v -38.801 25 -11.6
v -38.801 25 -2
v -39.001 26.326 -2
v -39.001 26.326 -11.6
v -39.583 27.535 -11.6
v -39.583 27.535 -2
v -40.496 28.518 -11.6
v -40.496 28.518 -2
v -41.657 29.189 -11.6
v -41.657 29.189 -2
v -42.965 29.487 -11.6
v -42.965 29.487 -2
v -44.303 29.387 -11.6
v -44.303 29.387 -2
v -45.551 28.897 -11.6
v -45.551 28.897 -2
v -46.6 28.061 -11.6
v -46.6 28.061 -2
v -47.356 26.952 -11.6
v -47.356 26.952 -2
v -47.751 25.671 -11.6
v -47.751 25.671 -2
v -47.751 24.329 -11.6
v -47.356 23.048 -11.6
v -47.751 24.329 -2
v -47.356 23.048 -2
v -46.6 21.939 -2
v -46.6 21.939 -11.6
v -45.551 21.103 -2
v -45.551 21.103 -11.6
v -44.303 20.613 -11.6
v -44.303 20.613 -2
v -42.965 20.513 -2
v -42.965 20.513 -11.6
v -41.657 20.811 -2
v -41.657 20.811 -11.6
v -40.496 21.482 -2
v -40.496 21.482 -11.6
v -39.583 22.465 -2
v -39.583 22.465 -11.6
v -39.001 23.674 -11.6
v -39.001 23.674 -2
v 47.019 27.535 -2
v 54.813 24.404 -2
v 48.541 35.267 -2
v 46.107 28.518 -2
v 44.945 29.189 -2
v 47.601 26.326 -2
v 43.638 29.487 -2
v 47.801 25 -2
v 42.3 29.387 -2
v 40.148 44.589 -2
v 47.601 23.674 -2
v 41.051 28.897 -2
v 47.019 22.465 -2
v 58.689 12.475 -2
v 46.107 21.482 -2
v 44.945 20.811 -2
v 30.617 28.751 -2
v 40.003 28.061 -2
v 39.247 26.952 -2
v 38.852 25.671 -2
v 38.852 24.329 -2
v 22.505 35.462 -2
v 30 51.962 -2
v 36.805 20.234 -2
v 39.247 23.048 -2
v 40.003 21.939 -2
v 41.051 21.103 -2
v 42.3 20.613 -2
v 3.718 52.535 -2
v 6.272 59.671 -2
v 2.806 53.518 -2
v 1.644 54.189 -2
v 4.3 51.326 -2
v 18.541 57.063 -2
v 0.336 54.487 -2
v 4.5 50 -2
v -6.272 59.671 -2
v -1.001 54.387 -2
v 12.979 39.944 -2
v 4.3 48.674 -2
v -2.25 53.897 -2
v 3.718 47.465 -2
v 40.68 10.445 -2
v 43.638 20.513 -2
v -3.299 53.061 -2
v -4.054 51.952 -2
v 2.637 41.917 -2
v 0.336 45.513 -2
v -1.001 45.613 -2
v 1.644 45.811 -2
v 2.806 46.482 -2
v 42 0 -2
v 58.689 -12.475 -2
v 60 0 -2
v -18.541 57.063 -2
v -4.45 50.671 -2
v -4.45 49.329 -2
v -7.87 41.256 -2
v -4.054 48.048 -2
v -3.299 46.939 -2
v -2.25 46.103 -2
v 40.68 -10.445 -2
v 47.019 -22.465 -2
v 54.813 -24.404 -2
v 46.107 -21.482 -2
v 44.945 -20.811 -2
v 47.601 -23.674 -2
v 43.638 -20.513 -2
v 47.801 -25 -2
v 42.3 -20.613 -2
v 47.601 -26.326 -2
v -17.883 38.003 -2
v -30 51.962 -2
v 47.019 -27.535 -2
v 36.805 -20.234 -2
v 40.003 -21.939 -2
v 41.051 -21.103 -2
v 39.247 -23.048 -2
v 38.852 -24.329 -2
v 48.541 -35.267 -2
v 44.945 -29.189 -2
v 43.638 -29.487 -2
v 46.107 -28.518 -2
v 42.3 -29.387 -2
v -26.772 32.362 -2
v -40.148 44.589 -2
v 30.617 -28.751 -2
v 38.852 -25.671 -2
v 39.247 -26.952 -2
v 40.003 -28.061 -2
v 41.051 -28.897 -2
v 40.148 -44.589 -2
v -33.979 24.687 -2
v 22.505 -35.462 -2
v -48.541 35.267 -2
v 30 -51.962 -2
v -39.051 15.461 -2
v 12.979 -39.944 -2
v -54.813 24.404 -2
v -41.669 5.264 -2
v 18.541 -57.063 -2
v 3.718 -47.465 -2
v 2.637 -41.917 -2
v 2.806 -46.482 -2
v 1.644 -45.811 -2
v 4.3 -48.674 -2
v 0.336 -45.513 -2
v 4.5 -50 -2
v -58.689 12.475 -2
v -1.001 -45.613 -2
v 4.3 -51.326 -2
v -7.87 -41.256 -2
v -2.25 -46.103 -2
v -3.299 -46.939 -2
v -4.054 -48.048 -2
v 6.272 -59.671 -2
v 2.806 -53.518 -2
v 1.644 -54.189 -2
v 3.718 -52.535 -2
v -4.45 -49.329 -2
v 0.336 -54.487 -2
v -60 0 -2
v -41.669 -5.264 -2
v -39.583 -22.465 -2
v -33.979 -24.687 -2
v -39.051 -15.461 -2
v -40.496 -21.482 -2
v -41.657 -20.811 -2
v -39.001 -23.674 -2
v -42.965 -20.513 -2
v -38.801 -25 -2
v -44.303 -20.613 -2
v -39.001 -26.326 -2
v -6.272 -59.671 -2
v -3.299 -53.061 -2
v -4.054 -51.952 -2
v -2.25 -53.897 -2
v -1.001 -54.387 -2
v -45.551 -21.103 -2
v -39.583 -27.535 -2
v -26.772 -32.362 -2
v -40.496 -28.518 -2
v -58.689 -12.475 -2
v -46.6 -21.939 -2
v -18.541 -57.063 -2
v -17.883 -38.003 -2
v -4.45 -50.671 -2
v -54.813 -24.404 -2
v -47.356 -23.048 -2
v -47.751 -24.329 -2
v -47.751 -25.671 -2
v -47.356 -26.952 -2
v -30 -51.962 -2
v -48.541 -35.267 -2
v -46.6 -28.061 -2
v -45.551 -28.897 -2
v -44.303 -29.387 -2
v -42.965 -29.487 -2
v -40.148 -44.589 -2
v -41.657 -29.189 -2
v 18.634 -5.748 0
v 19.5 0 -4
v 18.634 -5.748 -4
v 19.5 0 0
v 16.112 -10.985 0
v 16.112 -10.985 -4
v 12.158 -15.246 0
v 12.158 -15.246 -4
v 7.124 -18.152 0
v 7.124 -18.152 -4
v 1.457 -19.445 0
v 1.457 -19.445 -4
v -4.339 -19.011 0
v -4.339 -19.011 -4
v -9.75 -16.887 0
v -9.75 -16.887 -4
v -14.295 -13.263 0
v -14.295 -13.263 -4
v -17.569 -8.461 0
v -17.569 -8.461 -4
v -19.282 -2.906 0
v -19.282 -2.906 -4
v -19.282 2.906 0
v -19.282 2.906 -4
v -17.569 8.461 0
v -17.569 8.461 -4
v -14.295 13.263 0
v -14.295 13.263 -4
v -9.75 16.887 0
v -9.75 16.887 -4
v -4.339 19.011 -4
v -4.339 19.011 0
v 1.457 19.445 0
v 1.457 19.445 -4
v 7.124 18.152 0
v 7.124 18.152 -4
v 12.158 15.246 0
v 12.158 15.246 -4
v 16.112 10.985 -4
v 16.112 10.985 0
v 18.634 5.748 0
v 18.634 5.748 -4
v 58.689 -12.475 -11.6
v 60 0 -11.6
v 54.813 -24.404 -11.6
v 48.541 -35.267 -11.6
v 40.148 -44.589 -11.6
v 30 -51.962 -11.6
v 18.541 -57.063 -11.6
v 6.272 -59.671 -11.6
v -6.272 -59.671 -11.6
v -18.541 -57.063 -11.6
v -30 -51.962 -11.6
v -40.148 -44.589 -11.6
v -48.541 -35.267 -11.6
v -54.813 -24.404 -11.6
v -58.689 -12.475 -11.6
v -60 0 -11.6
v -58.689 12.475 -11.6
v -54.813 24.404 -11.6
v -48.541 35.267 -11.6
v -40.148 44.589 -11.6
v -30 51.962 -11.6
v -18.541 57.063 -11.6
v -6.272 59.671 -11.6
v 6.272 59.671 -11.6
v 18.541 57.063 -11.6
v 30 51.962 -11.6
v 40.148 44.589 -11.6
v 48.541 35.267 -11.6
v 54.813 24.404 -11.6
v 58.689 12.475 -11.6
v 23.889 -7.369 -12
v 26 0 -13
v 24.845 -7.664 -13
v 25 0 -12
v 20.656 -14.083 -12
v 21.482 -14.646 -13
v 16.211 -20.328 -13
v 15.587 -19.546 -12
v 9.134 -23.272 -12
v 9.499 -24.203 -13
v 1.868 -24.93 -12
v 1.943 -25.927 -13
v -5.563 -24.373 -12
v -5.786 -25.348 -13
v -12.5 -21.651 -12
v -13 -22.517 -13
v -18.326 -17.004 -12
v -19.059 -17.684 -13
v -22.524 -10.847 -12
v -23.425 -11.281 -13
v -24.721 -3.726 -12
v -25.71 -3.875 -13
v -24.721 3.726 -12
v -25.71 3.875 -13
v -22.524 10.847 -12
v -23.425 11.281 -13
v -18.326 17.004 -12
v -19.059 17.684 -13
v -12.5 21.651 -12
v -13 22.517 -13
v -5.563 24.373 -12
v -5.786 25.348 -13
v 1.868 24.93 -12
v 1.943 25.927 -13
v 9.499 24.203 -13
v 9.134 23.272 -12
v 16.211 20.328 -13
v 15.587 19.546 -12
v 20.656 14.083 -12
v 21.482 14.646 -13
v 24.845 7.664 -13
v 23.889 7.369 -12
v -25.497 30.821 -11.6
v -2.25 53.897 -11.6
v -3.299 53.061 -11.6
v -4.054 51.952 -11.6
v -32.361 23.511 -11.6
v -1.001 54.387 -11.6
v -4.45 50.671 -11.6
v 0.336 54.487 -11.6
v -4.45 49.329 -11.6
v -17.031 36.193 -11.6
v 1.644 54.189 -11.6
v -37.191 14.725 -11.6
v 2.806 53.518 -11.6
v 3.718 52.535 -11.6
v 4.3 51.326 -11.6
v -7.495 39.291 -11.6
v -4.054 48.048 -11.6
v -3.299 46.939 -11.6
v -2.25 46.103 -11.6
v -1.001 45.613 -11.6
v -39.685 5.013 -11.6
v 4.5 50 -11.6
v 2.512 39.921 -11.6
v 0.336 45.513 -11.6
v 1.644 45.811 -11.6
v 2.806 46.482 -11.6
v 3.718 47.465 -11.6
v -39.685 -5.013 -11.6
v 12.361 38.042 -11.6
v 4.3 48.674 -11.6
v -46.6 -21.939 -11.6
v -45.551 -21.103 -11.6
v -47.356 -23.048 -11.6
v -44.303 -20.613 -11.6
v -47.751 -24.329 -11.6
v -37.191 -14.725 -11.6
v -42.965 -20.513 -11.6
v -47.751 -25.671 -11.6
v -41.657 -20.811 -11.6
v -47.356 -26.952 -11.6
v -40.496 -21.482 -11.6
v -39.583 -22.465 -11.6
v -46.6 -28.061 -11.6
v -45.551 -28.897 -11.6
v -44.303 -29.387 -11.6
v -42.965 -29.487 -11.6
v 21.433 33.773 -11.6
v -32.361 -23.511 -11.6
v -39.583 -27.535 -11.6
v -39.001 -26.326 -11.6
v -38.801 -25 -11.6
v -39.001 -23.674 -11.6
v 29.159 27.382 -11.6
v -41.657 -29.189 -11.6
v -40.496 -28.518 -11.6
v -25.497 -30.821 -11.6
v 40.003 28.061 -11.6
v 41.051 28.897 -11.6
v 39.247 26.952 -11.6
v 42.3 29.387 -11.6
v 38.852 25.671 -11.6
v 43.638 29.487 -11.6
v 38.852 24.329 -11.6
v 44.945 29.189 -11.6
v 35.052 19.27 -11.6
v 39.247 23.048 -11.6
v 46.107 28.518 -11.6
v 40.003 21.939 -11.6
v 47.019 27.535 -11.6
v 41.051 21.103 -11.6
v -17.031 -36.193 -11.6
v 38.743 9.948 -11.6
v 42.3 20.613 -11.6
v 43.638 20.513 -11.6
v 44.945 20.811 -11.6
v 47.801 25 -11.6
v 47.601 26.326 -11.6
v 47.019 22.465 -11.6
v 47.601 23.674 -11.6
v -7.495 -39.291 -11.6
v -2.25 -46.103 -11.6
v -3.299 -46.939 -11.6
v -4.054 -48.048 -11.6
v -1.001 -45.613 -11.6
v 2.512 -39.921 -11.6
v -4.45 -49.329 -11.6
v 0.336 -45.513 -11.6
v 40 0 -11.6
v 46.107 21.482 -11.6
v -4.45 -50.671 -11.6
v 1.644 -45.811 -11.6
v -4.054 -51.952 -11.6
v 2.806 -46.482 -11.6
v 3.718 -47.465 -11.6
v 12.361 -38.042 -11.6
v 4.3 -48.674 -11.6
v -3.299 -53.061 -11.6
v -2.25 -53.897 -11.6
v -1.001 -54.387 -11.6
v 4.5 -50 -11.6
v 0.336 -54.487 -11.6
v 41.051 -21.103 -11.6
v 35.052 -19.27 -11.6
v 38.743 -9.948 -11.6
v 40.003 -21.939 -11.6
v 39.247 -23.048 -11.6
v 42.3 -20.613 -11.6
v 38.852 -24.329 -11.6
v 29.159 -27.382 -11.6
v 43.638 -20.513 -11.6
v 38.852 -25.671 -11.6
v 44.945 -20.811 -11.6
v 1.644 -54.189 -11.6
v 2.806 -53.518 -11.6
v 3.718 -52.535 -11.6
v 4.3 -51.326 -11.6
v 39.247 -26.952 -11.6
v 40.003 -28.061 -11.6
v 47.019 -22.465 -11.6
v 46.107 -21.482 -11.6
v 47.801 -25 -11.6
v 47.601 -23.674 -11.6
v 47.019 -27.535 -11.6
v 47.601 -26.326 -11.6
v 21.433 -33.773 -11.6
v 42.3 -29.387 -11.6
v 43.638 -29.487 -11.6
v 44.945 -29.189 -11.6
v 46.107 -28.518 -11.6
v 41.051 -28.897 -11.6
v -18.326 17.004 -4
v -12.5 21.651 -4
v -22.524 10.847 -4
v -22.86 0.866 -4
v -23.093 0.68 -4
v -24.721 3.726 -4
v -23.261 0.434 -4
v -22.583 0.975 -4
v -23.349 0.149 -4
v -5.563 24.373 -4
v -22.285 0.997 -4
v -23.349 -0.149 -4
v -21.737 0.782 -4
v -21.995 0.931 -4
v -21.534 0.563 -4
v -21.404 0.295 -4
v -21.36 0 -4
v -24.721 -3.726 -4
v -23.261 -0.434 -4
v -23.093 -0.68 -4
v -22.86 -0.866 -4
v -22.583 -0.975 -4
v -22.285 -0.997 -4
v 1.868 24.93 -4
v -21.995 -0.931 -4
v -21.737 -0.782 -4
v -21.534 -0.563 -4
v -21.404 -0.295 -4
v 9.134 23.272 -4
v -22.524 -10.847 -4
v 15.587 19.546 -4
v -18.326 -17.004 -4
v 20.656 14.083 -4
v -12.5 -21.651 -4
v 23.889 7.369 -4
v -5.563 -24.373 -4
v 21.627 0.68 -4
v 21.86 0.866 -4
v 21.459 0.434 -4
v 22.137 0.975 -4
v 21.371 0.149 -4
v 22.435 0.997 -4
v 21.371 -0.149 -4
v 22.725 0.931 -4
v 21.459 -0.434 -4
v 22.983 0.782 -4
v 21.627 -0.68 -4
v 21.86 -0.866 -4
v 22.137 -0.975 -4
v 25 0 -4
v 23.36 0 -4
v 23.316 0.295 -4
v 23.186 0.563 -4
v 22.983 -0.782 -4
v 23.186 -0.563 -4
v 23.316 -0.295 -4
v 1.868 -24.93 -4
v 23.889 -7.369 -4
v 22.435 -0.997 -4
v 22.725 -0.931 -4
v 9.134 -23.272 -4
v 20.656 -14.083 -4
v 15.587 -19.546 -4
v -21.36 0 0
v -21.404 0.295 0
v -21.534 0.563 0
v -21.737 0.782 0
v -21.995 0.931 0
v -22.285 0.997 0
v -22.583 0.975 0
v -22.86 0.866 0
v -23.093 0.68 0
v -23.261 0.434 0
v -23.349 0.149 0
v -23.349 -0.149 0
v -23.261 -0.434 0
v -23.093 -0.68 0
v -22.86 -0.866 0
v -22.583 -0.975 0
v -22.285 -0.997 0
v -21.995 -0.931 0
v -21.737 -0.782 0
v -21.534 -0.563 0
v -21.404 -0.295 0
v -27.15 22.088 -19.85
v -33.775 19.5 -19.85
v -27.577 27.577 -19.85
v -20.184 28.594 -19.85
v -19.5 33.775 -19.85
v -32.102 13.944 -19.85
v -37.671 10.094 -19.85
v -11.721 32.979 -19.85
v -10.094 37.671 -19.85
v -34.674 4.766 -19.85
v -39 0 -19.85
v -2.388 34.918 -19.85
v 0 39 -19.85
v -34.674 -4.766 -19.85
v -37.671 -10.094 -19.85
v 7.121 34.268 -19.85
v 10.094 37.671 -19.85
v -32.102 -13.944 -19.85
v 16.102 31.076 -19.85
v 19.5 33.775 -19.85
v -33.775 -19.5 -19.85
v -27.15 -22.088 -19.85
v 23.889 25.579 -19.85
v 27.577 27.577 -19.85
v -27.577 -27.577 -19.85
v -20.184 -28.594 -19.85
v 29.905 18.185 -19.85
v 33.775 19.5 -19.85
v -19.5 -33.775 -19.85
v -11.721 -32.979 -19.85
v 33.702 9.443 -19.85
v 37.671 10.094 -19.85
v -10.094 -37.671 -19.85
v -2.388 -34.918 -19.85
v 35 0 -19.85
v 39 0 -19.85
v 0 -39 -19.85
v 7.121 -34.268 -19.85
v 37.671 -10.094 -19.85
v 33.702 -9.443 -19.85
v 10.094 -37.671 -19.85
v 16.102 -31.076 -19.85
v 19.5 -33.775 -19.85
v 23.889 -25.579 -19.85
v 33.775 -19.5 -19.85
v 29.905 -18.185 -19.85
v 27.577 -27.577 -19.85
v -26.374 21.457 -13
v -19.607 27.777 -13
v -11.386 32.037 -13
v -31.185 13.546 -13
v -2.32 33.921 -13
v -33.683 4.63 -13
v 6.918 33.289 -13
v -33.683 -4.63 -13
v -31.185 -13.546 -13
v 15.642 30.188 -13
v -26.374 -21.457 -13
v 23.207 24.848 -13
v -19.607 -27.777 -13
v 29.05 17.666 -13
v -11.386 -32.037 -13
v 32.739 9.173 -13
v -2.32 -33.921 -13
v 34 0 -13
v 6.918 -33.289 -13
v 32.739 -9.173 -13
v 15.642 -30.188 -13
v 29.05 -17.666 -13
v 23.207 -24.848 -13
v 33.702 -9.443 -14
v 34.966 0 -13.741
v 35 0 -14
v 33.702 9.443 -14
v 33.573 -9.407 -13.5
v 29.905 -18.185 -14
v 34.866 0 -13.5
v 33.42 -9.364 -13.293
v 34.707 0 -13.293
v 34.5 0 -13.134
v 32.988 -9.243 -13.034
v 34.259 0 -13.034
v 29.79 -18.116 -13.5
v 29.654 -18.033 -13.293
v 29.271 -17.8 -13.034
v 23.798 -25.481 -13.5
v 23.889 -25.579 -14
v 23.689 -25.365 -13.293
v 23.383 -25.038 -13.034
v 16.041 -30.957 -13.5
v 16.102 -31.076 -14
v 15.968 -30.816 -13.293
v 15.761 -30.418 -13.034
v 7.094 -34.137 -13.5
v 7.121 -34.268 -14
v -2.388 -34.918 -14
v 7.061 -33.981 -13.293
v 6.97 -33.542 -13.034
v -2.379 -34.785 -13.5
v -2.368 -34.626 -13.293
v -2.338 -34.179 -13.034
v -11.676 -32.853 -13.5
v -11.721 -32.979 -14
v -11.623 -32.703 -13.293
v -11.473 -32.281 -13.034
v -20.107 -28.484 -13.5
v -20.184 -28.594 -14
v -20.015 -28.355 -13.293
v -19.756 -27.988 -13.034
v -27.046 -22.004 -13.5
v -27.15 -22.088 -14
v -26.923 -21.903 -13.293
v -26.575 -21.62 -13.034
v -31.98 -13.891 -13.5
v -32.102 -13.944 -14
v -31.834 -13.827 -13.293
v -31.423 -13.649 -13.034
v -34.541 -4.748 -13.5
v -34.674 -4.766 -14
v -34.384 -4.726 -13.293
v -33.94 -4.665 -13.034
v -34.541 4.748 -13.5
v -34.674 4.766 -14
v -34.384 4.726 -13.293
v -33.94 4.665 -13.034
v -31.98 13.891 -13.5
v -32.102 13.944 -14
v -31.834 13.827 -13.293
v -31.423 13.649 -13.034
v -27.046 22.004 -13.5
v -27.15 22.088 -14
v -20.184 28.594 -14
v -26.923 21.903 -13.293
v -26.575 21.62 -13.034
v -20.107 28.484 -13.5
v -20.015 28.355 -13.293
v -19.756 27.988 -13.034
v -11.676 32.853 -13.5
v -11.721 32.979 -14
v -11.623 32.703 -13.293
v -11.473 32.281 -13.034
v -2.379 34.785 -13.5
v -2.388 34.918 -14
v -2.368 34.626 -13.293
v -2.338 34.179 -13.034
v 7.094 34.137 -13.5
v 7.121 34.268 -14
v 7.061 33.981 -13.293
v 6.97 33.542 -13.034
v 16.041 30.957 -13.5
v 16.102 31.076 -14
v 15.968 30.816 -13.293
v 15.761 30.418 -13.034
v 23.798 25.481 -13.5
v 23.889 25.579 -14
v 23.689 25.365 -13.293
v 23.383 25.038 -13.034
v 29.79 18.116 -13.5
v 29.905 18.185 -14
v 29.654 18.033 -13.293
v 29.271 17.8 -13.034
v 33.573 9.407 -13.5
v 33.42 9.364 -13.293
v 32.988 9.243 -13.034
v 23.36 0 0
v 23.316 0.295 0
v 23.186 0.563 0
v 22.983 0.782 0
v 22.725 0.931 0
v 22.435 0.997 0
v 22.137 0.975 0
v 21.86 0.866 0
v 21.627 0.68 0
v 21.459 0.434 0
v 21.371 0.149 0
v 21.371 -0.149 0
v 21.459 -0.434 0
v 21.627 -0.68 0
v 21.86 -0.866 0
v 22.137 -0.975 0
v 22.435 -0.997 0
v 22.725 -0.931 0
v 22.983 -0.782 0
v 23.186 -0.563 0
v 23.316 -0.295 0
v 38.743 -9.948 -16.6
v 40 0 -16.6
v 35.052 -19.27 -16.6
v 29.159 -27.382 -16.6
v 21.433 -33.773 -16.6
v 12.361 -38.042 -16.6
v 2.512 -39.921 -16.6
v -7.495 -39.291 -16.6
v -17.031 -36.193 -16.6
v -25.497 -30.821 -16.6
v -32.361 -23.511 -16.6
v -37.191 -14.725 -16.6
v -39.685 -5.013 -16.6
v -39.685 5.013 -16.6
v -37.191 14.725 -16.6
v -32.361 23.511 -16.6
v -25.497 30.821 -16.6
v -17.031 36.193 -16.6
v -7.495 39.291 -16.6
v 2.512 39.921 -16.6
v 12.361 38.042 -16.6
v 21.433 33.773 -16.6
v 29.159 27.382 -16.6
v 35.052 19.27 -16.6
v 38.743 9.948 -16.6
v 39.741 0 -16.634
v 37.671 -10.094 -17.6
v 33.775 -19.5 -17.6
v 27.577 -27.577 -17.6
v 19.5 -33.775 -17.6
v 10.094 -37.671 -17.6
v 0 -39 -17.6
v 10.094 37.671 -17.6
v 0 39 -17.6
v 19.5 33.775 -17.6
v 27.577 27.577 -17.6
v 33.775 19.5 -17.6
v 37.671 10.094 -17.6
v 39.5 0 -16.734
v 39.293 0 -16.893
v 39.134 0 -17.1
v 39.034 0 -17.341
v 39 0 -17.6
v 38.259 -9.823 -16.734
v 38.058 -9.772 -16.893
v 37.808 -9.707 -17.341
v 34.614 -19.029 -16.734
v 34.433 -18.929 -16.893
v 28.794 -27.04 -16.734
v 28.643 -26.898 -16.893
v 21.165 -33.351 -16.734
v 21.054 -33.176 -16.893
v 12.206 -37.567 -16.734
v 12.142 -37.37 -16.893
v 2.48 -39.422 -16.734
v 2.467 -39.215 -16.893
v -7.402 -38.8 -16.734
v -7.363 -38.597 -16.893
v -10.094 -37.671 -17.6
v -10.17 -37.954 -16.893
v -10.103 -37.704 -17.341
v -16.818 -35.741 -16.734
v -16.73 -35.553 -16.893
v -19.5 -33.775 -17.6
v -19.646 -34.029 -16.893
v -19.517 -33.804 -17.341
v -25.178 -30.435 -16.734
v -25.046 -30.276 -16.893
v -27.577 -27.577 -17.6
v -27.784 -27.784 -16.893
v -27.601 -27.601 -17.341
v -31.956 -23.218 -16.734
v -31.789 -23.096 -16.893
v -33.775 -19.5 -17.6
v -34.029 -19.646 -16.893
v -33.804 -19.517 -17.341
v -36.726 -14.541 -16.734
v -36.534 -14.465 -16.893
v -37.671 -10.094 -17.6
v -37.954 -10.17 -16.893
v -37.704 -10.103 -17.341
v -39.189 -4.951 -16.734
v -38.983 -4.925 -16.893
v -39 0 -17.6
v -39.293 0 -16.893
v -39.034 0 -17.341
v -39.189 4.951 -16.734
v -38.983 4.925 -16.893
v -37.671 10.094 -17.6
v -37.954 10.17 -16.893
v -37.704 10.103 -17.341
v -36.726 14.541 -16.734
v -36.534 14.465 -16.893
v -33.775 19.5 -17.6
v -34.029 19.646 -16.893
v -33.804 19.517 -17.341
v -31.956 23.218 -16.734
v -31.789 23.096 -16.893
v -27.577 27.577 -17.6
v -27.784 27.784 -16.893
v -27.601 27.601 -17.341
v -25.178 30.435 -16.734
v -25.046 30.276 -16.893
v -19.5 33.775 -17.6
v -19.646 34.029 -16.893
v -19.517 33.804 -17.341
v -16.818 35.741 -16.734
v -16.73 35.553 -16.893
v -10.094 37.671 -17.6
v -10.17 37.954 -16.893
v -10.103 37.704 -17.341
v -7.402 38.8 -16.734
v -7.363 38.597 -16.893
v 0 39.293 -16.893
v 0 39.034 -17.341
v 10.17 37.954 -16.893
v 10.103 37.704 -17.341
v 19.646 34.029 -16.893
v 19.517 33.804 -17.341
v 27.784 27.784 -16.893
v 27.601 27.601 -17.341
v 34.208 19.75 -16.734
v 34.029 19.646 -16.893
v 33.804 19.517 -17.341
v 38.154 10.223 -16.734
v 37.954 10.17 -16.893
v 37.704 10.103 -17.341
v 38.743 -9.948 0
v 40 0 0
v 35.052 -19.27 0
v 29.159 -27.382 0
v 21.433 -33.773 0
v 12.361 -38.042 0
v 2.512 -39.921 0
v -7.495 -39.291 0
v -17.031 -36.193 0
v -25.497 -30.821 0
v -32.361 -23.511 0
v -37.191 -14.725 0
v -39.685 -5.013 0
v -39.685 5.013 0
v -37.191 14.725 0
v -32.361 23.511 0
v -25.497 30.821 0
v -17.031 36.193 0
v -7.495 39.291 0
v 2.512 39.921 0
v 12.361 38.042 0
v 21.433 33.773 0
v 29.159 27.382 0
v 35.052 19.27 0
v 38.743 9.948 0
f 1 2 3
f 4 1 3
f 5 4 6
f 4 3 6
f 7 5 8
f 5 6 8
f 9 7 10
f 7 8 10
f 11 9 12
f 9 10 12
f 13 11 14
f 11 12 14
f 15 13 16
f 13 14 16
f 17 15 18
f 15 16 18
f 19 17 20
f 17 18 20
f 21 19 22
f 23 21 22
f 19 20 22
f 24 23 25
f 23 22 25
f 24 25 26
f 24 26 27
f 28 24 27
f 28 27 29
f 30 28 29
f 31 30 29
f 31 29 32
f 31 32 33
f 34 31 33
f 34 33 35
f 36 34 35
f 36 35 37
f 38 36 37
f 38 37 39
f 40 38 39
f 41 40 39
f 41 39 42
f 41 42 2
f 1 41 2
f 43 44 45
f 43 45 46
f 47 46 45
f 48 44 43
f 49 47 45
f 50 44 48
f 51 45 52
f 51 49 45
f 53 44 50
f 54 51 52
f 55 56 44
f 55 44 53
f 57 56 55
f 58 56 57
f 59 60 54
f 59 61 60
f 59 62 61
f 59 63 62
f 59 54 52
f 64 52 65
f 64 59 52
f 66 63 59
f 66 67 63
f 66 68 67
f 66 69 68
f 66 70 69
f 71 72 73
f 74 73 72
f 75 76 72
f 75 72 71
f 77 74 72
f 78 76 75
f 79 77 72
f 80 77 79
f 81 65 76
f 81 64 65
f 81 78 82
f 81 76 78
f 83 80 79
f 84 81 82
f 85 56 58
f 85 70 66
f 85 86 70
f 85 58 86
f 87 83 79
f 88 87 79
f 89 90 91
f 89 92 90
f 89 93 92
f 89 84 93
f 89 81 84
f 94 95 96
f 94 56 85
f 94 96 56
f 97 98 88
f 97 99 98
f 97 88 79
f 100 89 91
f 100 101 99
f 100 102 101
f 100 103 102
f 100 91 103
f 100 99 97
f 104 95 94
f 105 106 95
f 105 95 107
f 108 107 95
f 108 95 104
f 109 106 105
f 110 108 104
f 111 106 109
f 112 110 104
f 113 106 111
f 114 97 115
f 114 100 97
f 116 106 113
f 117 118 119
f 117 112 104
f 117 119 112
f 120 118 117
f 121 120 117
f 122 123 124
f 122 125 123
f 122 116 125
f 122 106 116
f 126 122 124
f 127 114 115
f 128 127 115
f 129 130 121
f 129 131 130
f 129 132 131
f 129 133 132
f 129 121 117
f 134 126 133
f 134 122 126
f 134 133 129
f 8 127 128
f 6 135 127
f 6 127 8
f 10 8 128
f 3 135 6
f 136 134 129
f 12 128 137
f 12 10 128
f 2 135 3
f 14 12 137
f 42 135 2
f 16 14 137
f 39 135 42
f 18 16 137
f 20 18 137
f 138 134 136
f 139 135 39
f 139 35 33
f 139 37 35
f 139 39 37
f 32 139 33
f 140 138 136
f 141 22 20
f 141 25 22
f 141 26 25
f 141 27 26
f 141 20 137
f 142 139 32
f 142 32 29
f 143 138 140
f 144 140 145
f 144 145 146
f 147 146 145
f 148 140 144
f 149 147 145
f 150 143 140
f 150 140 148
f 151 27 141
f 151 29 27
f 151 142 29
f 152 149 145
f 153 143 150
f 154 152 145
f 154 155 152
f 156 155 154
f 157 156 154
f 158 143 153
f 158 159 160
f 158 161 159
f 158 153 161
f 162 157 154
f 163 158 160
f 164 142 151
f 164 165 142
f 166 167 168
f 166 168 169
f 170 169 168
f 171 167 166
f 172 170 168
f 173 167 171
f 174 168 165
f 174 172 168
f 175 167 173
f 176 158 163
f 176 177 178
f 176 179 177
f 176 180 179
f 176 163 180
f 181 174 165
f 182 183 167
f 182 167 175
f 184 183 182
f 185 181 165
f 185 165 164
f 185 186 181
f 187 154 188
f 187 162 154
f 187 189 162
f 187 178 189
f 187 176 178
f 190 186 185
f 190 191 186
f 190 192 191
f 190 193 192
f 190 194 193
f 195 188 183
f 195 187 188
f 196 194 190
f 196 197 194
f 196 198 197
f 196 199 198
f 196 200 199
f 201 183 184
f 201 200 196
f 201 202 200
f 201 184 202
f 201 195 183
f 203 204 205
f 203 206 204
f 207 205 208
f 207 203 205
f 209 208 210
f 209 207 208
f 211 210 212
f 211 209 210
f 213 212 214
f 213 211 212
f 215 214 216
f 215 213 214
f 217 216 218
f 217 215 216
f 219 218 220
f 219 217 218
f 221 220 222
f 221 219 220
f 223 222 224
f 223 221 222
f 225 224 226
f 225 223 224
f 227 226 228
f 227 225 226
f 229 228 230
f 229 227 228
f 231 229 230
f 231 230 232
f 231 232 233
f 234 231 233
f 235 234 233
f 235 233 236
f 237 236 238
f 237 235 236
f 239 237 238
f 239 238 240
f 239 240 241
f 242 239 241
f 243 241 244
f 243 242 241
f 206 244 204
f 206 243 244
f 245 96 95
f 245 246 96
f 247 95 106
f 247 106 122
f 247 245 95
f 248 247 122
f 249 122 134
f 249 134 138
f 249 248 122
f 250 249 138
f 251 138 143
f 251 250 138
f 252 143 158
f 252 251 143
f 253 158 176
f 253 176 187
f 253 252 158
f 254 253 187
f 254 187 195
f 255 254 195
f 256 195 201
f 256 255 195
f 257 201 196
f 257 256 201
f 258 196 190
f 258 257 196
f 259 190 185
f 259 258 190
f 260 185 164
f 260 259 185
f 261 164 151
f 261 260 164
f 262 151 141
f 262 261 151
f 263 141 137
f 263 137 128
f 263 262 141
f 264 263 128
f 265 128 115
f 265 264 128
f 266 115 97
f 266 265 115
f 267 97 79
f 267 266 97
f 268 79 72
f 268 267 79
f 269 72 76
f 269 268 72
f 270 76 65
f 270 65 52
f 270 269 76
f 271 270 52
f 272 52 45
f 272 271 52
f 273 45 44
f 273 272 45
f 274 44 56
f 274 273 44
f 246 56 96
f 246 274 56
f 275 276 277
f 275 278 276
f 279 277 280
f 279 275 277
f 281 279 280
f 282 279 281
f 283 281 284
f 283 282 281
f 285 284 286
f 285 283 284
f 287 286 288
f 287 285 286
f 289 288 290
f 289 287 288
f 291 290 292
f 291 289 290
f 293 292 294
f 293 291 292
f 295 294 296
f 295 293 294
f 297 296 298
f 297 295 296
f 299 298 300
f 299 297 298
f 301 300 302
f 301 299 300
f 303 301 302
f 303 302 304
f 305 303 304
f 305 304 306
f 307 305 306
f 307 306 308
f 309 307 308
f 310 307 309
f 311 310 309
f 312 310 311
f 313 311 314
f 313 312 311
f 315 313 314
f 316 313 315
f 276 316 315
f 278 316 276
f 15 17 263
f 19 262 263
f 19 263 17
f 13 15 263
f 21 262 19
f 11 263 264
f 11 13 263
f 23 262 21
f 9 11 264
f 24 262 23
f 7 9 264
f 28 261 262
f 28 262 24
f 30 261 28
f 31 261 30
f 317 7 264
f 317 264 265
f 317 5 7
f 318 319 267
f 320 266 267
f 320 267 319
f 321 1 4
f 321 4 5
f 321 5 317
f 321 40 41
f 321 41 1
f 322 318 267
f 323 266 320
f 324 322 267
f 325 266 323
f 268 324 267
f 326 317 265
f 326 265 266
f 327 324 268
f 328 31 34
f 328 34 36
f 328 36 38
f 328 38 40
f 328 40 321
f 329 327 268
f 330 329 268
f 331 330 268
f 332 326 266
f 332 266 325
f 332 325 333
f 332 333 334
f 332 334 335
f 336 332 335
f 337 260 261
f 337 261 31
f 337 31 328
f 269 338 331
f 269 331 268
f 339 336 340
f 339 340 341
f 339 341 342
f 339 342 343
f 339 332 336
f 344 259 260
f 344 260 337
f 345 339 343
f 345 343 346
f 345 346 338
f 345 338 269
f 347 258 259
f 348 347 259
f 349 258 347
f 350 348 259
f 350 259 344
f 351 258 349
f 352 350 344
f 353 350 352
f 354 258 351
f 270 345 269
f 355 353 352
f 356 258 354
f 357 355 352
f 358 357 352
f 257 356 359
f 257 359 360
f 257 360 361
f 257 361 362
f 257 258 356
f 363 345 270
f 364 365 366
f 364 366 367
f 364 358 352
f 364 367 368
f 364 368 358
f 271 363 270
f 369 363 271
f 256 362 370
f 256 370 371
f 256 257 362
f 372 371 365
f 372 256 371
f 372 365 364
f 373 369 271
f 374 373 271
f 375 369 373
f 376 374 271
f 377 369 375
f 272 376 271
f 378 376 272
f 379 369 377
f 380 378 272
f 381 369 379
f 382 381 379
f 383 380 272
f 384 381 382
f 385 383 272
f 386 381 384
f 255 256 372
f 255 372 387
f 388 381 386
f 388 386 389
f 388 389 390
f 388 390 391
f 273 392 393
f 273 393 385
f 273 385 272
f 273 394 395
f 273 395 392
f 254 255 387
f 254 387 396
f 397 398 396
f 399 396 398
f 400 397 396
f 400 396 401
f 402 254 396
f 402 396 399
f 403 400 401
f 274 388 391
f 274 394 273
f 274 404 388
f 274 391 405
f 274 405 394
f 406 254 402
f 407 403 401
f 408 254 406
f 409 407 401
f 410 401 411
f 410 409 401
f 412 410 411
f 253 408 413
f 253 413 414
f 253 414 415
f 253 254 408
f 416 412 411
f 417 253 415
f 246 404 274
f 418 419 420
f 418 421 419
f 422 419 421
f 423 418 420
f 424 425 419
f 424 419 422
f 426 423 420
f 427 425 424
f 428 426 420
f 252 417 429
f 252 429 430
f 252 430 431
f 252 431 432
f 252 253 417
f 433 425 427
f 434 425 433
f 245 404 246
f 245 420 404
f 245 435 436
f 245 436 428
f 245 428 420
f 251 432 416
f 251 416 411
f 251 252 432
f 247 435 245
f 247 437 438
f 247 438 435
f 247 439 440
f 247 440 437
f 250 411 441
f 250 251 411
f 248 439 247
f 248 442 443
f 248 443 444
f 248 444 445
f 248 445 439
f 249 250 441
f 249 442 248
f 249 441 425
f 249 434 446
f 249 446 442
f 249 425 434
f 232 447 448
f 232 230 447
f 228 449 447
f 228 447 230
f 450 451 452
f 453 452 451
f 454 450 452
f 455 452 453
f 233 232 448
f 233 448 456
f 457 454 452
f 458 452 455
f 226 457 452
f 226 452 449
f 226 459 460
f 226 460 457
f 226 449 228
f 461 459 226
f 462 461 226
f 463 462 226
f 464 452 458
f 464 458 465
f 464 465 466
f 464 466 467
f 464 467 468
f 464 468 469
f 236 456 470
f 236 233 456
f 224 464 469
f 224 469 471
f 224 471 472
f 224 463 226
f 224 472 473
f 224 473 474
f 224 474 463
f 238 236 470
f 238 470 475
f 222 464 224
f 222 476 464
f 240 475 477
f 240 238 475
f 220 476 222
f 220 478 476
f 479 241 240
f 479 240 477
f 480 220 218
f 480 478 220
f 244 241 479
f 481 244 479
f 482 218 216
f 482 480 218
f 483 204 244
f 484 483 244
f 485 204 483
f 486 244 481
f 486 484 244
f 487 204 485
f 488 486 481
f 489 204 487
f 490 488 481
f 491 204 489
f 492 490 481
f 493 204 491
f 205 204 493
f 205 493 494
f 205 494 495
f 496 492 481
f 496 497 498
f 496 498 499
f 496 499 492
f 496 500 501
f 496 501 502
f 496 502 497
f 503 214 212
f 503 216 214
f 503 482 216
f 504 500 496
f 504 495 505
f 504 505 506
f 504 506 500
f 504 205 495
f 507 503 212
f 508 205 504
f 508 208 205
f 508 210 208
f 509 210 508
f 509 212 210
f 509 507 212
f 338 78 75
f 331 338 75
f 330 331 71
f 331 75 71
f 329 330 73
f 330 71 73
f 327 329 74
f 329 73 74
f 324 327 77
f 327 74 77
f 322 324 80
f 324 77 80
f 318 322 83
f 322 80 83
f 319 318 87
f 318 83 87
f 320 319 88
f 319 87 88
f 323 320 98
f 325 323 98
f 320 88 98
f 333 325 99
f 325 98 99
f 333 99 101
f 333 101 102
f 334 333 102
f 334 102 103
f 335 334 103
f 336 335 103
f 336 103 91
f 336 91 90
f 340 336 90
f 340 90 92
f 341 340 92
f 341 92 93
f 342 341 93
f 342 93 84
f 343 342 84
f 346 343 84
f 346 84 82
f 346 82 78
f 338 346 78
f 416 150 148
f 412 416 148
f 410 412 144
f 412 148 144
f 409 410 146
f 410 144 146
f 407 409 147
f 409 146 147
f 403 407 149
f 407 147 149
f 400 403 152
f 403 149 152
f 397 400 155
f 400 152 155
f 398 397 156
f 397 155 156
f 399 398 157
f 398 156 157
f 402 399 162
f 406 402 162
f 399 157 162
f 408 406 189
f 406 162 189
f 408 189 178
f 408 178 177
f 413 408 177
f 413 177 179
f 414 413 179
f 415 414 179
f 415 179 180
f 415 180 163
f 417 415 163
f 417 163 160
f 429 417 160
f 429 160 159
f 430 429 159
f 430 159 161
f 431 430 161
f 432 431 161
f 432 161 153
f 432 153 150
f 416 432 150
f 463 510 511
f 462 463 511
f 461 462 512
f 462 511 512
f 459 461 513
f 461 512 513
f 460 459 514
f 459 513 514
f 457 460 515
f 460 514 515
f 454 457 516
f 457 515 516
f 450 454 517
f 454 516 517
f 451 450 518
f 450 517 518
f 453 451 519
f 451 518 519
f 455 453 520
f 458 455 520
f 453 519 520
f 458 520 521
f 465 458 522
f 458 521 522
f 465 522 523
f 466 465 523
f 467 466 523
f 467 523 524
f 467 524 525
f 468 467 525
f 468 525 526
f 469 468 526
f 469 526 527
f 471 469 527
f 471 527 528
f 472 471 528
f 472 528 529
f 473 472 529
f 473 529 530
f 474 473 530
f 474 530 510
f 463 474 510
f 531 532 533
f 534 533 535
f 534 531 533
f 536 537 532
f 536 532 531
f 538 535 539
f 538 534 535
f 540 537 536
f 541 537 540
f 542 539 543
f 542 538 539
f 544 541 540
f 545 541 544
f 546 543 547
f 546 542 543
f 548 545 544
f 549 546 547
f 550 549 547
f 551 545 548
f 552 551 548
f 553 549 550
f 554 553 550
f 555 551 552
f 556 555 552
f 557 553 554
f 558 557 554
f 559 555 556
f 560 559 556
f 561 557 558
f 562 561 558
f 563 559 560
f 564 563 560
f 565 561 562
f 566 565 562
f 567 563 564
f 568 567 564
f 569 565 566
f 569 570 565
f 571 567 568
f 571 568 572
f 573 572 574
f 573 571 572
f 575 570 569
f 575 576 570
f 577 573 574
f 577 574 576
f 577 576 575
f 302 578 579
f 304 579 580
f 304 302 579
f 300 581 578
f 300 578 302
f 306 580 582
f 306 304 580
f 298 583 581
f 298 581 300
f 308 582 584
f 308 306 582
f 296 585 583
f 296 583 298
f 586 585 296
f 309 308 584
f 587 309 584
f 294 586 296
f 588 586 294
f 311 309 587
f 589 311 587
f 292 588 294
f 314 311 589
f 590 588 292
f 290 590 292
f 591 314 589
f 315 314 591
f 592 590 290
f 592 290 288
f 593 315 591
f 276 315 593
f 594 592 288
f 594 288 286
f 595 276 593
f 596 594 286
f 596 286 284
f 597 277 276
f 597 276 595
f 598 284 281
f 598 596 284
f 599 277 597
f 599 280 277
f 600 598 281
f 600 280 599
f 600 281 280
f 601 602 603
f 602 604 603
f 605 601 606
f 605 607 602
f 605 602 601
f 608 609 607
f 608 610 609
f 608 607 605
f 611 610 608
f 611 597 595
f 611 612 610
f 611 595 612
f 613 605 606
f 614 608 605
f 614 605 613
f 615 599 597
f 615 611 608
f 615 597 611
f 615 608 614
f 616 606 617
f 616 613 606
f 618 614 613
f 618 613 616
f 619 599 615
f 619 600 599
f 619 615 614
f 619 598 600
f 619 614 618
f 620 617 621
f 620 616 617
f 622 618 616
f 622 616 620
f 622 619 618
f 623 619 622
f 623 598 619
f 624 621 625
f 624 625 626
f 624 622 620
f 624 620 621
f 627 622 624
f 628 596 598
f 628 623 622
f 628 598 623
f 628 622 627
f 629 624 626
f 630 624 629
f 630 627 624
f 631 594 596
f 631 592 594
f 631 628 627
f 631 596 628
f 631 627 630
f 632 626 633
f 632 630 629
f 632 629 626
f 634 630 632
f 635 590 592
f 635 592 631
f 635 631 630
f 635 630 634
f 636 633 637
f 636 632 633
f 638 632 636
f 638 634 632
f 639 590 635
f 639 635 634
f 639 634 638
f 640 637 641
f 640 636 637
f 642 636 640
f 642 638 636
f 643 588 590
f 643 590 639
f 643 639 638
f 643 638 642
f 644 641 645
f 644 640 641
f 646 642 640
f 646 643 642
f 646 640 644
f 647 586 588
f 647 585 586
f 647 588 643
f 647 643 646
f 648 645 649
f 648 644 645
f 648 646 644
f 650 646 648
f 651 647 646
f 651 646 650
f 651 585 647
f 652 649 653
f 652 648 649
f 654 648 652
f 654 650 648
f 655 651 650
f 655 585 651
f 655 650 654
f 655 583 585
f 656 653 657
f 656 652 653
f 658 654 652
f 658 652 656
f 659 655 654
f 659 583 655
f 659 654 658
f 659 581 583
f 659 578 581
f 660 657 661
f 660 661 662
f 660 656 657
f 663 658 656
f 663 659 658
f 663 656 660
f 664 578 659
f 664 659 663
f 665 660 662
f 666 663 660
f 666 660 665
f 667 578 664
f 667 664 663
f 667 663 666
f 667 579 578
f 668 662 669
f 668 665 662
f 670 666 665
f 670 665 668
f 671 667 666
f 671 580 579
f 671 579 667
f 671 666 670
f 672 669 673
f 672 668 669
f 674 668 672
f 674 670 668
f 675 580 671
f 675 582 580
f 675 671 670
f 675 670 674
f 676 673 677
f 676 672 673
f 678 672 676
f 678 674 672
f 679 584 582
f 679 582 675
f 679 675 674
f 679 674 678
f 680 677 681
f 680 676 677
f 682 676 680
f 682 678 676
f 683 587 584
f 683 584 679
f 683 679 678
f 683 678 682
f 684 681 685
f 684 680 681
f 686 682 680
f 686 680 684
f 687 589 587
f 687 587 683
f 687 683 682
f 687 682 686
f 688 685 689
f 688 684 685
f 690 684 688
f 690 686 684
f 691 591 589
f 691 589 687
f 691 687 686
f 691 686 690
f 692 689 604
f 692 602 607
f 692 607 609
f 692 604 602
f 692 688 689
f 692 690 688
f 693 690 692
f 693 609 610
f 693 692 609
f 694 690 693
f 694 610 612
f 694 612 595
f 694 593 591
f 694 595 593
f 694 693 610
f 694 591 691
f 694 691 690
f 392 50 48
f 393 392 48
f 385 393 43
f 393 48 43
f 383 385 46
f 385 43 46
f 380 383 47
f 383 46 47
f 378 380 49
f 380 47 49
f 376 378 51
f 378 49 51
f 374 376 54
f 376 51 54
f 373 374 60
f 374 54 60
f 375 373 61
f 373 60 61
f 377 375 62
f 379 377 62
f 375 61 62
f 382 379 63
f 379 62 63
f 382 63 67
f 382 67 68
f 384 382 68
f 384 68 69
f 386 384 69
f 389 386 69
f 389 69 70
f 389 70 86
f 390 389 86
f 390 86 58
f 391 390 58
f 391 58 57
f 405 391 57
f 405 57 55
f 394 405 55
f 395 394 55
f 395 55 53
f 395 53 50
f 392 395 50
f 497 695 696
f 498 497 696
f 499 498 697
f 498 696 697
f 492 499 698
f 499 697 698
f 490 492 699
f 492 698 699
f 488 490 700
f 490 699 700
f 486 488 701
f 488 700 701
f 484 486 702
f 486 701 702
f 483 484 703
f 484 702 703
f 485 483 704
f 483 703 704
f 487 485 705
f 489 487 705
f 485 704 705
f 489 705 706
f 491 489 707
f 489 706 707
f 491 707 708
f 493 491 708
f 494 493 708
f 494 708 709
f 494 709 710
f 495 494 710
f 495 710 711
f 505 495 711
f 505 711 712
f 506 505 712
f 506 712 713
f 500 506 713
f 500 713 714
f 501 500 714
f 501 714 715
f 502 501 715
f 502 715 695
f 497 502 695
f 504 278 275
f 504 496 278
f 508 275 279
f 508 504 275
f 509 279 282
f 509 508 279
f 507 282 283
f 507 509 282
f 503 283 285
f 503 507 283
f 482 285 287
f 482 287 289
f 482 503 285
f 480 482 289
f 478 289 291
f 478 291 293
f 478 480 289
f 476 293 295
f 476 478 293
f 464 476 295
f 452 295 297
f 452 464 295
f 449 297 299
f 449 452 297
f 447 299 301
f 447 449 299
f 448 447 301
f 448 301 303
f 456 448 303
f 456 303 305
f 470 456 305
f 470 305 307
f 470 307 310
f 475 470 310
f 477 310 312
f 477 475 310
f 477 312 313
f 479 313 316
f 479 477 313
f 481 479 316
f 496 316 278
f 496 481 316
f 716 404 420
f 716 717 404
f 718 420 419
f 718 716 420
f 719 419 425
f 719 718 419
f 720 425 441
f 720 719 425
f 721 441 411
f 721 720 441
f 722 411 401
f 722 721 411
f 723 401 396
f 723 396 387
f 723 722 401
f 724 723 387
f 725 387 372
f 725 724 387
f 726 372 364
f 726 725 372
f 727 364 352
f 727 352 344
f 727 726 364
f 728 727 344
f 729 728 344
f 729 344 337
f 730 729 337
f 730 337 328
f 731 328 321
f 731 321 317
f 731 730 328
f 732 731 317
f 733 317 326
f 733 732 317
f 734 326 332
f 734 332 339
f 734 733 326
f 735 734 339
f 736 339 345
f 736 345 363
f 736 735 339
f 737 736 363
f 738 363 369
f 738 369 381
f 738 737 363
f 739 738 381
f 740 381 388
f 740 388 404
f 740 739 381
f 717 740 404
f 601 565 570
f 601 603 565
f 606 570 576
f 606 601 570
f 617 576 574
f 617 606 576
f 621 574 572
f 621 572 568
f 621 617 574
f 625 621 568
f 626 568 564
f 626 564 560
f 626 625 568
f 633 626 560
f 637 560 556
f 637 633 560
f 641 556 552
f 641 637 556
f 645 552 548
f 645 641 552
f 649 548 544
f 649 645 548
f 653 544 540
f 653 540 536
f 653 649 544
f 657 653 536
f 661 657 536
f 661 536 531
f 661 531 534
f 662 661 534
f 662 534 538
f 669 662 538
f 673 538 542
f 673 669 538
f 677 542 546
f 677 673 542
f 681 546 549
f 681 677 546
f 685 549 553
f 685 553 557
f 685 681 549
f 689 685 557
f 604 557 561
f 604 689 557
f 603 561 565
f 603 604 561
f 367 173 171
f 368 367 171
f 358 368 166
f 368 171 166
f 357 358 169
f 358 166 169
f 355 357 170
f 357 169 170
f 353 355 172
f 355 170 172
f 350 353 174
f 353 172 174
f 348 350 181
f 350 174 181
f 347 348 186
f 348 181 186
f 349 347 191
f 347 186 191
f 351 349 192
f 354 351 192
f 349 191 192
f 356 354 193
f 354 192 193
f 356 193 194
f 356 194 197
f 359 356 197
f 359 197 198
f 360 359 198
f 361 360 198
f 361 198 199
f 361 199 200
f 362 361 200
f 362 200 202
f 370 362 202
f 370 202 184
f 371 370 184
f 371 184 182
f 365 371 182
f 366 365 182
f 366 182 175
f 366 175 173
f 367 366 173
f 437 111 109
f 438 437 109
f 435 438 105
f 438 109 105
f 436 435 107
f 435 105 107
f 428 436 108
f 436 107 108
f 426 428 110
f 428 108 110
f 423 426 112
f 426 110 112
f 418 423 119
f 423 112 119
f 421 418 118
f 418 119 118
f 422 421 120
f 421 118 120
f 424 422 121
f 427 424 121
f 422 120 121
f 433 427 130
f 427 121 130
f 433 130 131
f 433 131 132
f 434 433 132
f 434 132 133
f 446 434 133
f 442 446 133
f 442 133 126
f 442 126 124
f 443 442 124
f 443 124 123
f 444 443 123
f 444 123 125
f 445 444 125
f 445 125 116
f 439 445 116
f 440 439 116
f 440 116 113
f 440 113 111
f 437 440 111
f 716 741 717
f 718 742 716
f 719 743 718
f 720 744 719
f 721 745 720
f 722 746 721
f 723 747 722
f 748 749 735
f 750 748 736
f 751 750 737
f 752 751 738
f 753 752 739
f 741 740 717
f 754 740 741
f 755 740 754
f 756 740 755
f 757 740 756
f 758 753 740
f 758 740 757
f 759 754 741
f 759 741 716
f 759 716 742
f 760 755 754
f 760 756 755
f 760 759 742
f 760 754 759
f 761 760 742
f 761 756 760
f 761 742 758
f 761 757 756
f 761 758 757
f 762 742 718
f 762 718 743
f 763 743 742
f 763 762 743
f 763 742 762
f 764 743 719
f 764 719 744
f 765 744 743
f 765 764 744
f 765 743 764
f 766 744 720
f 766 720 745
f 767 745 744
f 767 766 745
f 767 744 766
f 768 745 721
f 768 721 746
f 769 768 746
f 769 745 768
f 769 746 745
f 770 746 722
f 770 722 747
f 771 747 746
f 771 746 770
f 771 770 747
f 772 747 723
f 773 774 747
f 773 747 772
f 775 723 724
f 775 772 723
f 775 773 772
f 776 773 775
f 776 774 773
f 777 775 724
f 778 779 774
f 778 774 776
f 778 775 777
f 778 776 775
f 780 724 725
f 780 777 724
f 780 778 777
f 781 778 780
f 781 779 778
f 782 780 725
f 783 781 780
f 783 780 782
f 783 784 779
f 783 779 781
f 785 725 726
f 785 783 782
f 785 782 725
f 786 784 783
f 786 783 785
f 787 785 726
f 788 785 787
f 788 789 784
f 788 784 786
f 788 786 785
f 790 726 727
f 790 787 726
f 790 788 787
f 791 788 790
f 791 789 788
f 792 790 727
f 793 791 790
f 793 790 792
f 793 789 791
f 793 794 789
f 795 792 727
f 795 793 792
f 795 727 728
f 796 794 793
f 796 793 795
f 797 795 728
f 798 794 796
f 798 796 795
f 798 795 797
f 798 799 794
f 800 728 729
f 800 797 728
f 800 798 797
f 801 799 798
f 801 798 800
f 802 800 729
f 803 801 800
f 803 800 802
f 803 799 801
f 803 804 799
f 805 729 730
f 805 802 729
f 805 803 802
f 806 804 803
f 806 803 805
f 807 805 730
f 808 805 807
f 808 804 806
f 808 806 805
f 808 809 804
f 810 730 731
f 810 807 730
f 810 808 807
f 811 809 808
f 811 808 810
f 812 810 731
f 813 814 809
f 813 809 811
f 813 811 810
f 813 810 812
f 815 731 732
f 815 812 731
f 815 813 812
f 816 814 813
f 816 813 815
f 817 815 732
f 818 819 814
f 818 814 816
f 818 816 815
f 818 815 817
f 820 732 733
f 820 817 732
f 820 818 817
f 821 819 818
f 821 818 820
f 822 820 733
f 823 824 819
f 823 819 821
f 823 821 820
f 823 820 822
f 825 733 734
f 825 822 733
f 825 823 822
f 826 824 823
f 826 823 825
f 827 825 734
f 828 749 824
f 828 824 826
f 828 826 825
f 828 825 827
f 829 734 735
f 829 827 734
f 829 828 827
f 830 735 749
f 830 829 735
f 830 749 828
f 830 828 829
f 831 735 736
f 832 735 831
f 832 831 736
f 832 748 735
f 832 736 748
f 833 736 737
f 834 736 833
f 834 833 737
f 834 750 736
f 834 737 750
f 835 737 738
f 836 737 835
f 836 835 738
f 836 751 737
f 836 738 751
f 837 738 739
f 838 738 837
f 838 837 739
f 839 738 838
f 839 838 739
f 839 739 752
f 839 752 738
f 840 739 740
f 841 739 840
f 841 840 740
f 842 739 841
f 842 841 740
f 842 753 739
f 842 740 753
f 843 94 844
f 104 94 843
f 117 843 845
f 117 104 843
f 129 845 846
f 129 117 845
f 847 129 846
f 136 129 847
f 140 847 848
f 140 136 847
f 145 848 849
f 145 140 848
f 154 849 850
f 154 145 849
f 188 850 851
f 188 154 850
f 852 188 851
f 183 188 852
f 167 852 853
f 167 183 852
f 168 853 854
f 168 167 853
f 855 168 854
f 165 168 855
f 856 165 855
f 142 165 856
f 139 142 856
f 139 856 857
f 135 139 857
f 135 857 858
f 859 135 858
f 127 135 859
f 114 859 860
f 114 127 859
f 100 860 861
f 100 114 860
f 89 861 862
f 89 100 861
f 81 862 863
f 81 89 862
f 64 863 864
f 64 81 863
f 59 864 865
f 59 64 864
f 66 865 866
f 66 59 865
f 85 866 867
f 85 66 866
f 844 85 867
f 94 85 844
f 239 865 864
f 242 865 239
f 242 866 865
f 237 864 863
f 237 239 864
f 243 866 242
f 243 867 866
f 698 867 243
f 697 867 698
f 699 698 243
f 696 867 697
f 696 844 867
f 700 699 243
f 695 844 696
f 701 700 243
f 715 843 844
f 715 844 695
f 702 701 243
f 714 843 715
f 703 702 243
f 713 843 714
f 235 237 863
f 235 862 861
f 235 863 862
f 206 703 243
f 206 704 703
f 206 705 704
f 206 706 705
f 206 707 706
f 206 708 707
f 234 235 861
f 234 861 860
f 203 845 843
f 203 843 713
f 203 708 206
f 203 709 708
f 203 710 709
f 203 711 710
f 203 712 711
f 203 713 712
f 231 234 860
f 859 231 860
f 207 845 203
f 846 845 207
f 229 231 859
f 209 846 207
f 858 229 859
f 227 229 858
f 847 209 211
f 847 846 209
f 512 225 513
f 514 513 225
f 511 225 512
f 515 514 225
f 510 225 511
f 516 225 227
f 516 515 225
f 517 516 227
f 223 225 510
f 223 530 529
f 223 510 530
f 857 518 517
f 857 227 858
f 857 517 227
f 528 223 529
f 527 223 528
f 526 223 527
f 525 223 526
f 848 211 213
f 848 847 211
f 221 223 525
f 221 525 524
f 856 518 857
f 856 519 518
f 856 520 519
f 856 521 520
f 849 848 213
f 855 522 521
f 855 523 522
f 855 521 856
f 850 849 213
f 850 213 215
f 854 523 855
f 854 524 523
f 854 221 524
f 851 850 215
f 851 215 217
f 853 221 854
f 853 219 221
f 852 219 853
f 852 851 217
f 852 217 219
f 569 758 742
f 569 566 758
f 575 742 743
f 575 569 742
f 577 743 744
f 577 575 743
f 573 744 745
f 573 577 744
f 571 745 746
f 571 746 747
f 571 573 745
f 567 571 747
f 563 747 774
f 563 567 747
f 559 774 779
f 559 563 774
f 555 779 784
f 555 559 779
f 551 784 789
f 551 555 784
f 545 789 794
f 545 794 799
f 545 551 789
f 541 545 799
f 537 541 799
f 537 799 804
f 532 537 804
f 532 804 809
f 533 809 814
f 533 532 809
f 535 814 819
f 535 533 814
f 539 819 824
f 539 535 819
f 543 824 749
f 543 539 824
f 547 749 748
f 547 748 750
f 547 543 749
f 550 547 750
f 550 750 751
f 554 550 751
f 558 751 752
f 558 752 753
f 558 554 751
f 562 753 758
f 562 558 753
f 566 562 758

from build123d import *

# Parameters (mm, degrees)
CUT_EXTRUDE1_REACH = 88.71
SKETCH6_R          = 4.5
CUT_EXTRUDE2_REACH = 89.144
SKETCH10_R         = 1


with BuildPart() as part:
    # Sketch1 → Revolve1 (revolve)
    with BuildSketch(Plane(origin=(0, 0, 0), x_dir=(0, 0, -1), z_dir=(1, 0, 0))):
        with BuildLine():
            Line((0, 19.5), (0, 40))
            Line((0, 40), (2, 42))
            Line((2, 42), (2, 60))
            Line((2, 60), (11.6, 60))
            Line((11.6, 60), (11.6, 40))
            Line((11.6, 40), (16.6, 40))
            ThreePointArc((16.6, 40), (16.892893219, 39.292893219), (17.6, 39))
            Line((17.6, 39), (19.85, 39))
            Line((19.85, 39), (19.85, 35))
            Line((19.85, 35), (14, 35))
            ThreePointArc((14, 35), (13.292893219, 34.707106781), (13, 34))
            Line((13, 34), (13, 26))
            Line((13, 26), (12, 25))
            Line((12, 25), (4, 25))
            Line((4, 25), (4, 19.5))
            Line((4, 19.5), (0, 19.5))
        make_face()
    revolve(axis=Axis((0, 0, 0), (0, 0, -1)))

    # Sketch6 → Cut-Extrude1 (cut, up to next)
    with BuildSketch(Plane.XY.offset(-2), mode=Mode.PRIVATE) as cut_extrude1_sk1:
        with Locations((0, -50)):
            Circle(SKETCH6_R)
    cut_extrude1_tool1 = extrude(cut_extrude1_sk1.sketch, amount=-CUT_EXTRUDE1_REACH, mode=Mode.PRIVATE) & part.part
    # Sketch6 → Cut-Extrude1 (cut, up to next)
    with BuildSketch(Plane.XY.offset(-2), mode=Mode.PRIVATE) as cut_extrude1_sk2:
        with Locations((-43.301270189, -25)):
            Circle(SKETCH6_R)
    cut_extrude1_tool2 = extrude(cut_extrude1_sk2.sketch, amount=-CUT_EXTRUDE1_REACH, mode=Mode.PRIVATE) & part.part
    # Sketch6 → Cut-Extrude1 (cut, up to next)
    with BuildSketch(Plane.XY.offset(-2), mode=Mode.PRIVATE) as cut_extrude1_sk3:
        with Locations((-43.301270189, 25)):
            Circle(SKETCH6_R)
    cut_extrude1_tool3 = extrude(cut_extrude1_sk3.sketch, amount=-CUT_EXTRUDE1_REACH, mode=Mode.PRIVATE) & part.part
    # Sketch6 → Cut-Extrude1 (cut, up to next)
    with BuildSketch(Plane.XY.offset(-2), mode=Mode.PRIVATE) as cut_extrude1_sk4:
        with Locations((0, 50)):
            Circle(SKETCH6_R)
    cut_extrude1_tool4 = extrude(cut_extrude1_sk4.sketch, amount=-CUT_EXTRUDE1_REACH, mode=Mode.PRIVATE) & part.part
    # Sketch6 → Cut-Extrude1 (cut, up to next)
    with BuildSketch(Plane.XY.offset(-2), mode=Mode.PRIVATE) as cut_extrude1_sk5:
        with Locations((43.301270189, 25)):
            Circle(SKETCH6_R)
    cut_extrude1_tool5 = extrude(cut_extrude1_sk5.sketch, amount=-CUT_EXTRUDE1_REACH, mode=Mode.PRIVATE) & part.part
    # Sketch6 → Cut-Extrude1 (cut, up to next)
    with BuildSketch(Plane.XY.offset(-2), mode=Mode.PRIVATE) as cut_extrude1_sk6:
        with Locations((43.301270189, -25)):
            Circle(SKETCH6_R)
    cut_extrude1_tool6 = extrude(cut_extrude1_sk6.sketch, amount=-CUT_EXTRUDE1_REACH, mode=Mode.PRIVATE) & part.part
    add(cut_extrude1_tool1.solids().sort_by_distance((0, -50, -2))[0], mode=Mode.SUBTRACT)
    add(cut_extrude1_tool2.solids().sort_by_distance((-43.30127, -25, -2))[0], mode=Mode.SUBTRACT)
    add(cut_extrude1_tool3.solids().sort_by_distance((-43.30127, 25, -2))[0], mode=Mode.SUBTRACT)
    add(cut_extrude1_tool4.solids().sort_by_distance((0, 50, -2))[0], mode=Mode.SUBTRACT)
    add(cut_extrude1_tool5.solids().sort_by_distance((43.30127, 25, -2))[0], mode=Mode.SUBTRACT)
    add(cut_extrude1_tool6.solids().sort_by_distance((43.30127, -25, -2))[0], mode=Mode.SUBTRACT)

    # Sketch10 → Cut-Extrude2 (cut, up to next)
    with BuildSketch(Plane.XY, mode=Mode.PRIVATE) as cut_extrude2_sk1:
        with Locations((-22.36, 0)):
            Circle(SKETCH10_R)
    cut_extrude2_tool1 = extrude(cut_extrude2_sk1.sketch, amount=-CUT_EXTRUDE2_REACH, mode=Mode.PRIVATE) & part.part
    # Sketch10 → Cut-Extrude2 (cut, up to next)
    with BuildSketch(Plane.XY, mode=Mode.PRIVATE) as cut_extrude2_sk2:
        with Locations((22.36, 0)):
            Circle(SKETCH10_R)
    cut_extrude2_tool2 = extrude(cut_extrude2_sk2.sketch, amount=-CUT_EXTRUDE2_REACH, mode=Mode.PRIVATE) & part.part
    add(cut_extrude2_tool1.solids().sort_by_distance((-22.36, 0, 0))[0], mode=Mode.SUBTRACT)
    add(cut_extrude2_tool2.solids().sort_by_distance((22.36, 0, 0))[0], mode=Mode.SUBTRACT)


solid = part.part
